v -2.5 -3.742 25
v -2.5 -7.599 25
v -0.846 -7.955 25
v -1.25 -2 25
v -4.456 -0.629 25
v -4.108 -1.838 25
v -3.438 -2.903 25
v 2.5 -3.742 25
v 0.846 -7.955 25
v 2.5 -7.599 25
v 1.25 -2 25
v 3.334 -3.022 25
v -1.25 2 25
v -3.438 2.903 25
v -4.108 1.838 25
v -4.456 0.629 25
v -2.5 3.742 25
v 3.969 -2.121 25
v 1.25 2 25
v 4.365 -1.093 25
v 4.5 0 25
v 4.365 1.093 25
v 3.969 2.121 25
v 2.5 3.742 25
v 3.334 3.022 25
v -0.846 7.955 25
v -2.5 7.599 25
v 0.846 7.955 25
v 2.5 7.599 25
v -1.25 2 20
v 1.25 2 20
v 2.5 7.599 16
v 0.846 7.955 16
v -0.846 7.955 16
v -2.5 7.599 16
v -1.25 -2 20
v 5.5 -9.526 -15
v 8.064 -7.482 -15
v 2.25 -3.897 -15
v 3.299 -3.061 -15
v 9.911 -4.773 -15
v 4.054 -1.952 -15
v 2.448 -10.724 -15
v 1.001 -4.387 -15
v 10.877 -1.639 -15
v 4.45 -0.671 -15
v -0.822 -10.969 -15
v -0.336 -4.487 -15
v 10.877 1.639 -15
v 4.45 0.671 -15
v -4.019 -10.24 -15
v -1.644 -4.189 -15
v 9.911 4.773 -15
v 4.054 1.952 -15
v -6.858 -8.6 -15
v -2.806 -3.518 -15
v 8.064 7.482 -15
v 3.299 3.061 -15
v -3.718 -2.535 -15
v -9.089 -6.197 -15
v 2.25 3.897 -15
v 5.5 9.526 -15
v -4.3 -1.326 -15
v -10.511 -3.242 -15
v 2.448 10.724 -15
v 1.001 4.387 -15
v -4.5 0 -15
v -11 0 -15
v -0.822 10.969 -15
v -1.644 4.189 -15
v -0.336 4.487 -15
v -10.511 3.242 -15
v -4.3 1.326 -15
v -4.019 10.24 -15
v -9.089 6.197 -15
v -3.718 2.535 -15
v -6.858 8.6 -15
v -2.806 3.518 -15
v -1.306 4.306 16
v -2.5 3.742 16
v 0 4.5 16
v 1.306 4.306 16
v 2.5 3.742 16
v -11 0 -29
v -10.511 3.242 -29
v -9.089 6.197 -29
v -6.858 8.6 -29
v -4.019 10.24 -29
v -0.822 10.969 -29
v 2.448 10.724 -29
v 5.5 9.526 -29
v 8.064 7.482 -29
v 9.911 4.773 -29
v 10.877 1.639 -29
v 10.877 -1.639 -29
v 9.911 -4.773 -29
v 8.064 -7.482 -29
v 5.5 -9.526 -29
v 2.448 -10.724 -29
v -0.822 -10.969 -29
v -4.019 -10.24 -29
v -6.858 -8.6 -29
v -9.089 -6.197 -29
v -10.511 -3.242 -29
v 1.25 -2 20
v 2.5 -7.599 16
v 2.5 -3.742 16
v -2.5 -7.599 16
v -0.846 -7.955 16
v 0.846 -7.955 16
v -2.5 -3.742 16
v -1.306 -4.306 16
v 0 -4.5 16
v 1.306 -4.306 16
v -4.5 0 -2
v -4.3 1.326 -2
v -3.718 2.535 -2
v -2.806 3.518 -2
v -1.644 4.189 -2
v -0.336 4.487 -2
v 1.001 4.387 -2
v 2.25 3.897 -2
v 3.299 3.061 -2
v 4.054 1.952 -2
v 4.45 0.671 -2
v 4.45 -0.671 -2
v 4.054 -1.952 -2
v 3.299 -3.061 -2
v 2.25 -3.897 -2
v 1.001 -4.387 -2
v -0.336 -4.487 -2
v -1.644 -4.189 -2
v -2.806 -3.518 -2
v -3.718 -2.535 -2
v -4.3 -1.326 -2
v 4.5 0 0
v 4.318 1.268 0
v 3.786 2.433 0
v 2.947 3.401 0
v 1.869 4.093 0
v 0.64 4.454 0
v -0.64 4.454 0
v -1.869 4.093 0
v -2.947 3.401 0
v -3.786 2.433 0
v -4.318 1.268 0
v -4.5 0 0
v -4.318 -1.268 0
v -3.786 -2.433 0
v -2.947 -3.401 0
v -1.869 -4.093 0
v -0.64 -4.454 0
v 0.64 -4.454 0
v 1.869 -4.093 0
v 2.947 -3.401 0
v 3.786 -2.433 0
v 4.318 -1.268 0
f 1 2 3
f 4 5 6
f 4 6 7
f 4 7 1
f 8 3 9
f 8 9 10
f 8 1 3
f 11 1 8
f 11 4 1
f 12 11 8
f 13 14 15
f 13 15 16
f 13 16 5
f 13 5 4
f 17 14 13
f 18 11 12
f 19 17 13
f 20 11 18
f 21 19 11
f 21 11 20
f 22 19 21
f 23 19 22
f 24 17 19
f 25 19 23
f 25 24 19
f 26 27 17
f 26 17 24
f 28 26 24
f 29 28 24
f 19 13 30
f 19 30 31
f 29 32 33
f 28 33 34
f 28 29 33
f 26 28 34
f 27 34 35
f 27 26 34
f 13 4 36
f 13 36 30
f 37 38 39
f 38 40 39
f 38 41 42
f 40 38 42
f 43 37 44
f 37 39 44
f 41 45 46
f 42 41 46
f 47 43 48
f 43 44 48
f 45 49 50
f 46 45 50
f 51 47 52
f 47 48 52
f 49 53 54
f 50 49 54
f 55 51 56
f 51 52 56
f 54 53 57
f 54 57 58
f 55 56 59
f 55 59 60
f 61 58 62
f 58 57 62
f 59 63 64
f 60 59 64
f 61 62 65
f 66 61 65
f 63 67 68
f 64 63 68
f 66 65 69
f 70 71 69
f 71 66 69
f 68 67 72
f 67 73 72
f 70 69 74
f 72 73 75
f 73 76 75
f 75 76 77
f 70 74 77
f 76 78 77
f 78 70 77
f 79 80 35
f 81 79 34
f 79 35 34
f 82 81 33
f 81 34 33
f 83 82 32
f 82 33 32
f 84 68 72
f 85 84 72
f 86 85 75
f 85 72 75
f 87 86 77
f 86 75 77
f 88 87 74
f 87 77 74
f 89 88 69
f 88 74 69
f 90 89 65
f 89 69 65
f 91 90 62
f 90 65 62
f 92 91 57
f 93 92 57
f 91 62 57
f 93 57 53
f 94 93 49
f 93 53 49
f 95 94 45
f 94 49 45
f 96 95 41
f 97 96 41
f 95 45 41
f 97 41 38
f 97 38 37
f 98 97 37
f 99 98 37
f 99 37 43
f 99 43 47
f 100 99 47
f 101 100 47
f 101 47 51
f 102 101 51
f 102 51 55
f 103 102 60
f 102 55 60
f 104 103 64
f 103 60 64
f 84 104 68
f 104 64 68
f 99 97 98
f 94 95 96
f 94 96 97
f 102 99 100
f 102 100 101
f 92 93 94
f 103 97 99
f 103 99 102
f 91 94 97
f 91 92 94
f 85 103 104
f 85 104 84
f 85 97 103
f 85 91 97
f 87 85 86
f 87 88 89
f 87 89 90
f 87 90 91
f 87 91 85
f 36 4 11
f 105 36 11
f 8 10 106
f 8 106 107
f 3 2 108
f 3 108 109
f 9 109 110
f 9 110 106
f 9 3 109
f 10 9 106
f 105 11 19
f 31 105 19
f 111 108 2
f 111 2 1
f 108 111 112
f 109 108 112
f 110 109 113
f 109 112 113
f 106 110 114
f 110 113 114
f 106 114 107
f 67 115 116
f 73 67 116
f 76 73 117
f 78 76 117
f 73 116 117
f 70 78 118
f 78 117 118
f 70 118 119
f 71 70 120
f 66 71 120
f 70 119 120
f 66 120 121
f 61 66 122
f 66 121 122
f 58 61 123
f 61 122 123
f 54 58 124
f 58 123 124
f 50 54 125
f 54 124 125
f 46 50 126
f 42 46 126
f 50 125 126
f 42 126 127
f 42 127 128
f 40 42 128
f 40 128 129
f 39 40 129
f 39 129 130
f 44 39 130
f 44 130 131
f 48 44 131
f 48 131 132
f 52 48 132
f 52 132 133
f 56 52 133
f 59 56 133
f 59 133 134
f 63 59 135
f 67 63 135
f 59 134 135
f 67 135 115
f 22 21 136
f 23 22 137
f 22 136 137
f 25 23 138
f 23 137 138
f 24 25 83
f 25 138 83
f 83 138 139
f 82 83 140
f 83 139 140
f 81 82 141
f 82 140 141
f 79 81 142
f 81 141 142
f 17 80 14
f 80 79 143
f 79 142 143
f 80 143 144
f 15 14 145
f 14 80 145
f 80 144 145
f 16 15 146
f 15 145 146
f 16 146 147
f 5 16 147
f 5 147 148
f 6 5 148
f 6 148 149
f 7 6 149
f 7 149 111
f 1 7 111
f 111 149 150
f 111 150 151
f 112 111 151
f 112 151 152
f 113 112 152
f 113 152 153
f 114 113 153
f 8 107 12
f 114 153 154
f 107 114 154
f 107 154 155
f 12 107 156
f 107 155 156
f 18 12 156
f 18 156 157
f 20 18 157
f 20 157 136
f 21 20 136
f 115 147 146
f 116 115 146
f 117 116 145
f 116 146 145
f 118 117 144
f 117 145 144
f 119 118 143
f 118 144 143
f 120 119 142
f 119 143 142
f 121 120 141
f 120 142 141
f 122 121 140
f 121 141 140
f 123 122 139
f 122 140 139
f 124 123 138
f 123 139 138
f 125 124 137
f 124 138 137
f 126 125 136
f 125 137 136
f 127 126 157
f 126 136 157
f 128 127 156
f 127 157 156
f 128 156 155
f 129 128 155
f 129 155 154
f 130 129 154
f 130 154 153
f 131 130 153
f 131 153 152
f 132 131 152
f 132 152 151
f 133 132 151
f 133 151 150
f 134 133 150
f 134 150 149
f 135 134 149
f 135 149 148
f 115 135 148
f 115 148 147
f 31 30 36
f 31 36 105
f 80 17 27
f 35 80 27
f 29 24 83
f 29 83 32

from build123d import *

# Parameters (mm, degrees)
CROQUIS1_R              = 4.5
SALIENTE_EXTRUIR1_DEPTH = 25
CROQUIS2_W              = 5
CROQUIS2_H              = 17
SALIENTE_EXTRUIR2_DEPTH = 9
CROQUIS3_R              = 11
CROQUIS3_R_2            = 8
CORTAR_EXTRUIR1_DEPTH   = 9
CROQUIS4_R              = 4.5
SALIENTE_EXTRUIR4_DEPTH = 2
CROQUIS6_W              = 2.5
CROQUIS6_H              = 4
CORTAR_EXTRUIR2_DEPTH   = 5
CROQUIS8_R              = 4.5
SALIENTE_EXTRUIR5_DEPTH = 13
CROQUIS9_R              = 11
SALIENTE_EXTRUIR6_DEPTH = 14


with BuildPart() as part:
    # Croquis1 → Saliente-Extruir1 (new body)
    with BuildSketch(Plane.XY):
        Circle(CROQUIS1_R)
    extrude(amount=SALIENTE_EXTRUIR1_DEPTH)

    # Croquis2 → Saliente-Extruir2 (add)
    with BuildSketch(Plane.XY.offset(25)):
        Rectangle(CROQUIS2_W, CROQUIS2_H)
    extrude(amount=-SALIENTE_EXTRUIR2_DEPTH)

    # Croquis3 → Cortar-Extruir1 (cut)
    with BuildSketch(Plane.XY.offset(25)):
        Circle(CROQUIS3_R)
        Circle(CROQUIS3_R_2, mode=Mode.SUBTRACT)
    extrude(amount=-CORTAR_EXTRUIR1_DEPTH, mode=Mode.SUBTRACT)

    # Croquis4 → Saliente-Extruir4 (add)
    with BuildSketch(Plane(origin=(0, 0, 0), x_dir=(-1, 0, 0), z_dir=(0, 0, -1))):
        Circle(CROQUIS4_R)
    extrude(amount=SALIENTE_EXTRUIR4_DEPTH)

    # Croquis6 → Cortar-Extruir2 (cut)
    with BuildSketch(Plane.XY.offset(25)):
        Rectangle(CROQUIS6_W, CROQUIS6_H)
    extrude(amount=-CORTAR_EXTRUIR2_DEPTH, mode=Mode.SUBTRACT)

    # Croquis8 → Saliente-Extruir5 (add)
    with BuildSketch(Plane(origin=(0, 0, -2), x_dir=(-1, 0, 0), z_dir=(0, 0, -1))):
        Circle(CROQUIS8_R)
    extrude(amount=SALIENTE_EXTRUIR5_DEPTH)

    # Croquis9 → Saliente-Extruir6 (add)
    with BuildSketch(Plane(origin=(0, 0, -15), x_dir=(-1, 0, 0), z_dir=(0, 0, -1))):
        Circle(CROQUIS9_R)
    extrude(amount=SALIENTE_EXTRUIR6_DEPTH)


solid = part.part
